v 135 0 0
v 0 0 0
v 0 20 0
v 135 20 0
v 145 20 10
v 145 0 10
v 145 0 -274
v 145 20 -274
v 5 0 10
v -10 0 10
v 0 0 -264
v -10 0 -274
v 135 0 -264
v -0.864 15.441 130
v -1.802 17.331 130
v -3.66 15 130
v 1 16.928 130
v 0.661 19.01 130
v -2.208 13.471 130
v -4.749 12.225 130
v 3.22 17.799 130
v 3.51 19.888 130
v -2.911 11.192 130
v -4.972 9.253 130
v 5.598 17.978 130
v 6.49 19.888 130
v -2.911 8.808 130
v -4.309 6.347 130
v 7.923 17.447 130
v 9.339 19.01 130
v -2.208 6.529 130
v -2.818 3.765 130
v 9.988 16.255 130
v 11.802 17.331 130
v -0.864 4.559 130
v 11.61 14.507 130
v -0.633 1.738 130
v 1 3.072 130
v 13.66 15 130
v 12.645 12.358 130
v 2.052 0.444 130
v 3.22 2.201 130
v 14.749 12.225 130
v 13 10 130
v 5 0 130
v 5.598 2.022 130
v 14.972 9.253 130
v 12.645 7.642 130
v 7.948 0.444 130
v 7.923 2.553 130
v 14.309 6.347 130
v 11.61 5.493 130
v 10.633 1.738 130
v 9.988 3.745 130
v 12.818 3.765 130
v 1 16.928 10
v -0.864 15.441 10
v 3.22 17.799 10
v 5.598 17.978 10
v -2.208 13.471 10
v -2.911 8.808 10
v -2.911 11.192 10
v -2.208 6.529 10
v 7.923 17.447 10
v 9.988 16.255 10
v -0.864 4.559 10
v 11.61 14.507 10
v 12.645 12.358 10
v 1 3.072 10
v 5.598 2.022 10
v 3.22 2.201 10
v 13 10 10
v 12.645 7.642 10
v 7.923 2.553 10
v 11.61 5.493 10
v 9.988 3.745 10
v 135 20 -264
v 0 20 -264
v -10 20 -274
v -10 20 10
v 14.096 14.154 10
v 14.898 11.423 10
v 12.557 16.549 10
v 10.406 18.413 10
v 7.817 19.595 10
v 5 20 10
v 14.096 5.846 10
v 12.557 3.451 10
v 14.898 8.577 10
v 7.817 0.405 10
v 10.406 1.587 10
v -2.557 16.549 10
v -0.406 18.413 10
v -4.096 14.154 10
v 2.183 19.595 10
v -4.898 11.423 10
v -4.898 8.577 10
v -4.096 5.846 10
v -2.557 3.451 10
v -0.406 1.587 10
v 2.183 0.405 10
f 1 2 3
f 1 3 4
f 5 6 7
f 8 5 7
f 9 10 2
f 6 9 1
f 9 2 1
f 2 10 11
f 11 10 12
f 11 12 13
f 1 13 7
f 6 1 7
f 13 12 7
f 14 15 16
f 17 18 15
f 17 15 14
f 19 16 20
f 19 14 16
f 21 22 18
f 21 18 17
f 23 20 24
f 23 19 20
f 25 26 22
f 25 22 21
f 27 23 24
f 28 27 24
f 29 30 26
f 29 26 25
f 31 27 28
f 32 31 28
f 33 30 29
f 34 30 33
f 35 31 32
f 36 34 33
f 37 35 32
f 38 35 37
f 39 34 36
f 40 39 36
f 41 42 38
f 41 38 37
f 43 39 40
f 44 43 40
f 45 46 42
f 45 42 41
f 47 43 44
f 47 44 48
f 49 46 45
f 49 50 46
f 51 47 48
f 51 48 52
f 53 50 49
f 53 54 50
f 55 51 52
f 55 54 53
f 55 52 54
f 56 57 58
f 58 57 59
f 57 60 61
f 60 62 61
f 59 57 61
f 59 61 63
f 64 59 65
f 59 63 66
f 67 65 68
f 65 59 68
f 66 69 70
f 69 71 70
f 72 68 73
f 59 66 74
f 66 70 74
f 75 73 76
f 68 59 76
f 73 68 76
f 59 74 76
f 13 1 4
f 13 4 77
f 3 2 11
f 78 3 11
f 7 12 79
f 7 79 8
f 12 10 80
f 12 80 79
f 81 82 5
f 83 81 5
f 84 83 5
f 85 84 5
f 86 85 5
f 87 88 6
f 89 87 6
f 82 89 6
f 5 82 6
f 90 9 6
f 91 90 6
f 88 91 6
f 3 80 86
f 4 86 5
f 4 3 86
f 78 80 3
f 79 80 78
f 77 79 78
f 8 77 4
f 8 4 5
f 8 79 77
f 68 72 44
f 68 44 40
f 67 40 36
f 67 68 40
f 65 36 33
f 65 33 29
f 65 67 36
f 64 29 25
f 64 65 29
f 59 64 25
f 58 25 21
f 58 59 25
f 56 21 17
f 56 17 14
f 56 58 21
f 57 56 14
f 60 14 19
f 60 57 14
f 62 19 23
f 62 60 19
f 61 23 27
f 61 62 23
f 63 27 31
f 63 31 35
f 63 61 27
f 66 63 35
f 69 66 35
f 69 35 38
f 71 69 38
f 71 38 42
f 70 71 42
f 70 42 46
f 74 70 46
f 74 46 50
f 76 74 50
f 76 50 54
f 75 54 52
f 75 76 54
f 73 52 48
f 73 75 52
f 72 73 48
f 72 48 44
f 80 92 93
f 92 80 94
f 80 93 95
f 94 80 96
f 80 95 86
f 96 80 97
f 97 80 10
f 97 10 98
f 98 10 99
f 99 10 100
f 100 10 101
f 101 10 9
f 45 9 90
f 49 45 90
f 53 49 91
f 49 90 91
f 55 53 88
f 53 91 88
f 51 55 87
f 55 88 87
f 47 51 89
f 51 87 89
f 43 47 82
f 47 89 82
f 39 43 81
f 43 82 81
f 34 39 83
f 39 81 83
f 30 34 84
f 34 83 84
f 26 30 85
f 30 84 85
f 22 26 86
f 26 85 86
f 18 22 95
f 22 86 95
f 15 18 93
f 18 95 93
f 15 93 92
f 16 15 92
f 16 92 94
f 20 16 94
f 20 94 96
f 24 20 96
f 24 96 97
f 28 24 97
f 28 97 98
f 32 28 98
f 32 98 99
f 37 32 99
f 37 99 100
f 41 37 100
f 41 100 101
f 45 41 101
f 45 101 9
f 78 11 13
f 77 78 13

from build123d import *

# Parameters (mm, degrees)
SCHIZZO1_W                   = 155
SCHIZZO1_H                   = 284
SCHIZZO1_W_2                 = 135
SCHIZZO1_H_2                 = 264
ESTRUSIONE_SOTTILE1_DEPTH    = 20
SCHIZZO2_R                   = 10
SCHIZZO2_R_2                 = 8
ESTRUSIONE_ESTRUSIONE1_DEPTH = 120


with BuildPart() as part:
    # Schizzo1 → Estrusione-Sottile1 (new body)
    with BuildSketch(Plane(origin=(0, 0, 0), x_dir=(1, 0, 0), z_dir=(0, 1, 0))):
        with Locations((67.5, 132)):
            Rectangle(SCHIZZO1_W, SCHIZZO1_H)
        with Locations((67.5, 132)):
            Rectangle(SCHIZZO1_W_2, SCHIZZO1_H_2, mode=Mode.SUBTRACT)
    extrude(amount=ESTRUSIONE_SOTTILE1_DEPTH)

    # Schizzo2 → Estrusione-Estrusione1 (add)
    with BuildSketch(Plane.XY.offset(10)):
        with Locations(Location((5, 10, 0), (0, 0, 270))):
            Circle(SCHIZZO2_R)
        with Locations((5, 10)):
            Circle(SCHIZZO2_R_2, mode=Mode.SUBTRACT)
    extrude(amount=ESTRUSIONE_ESTRUSIONE1_DEPTH)


solid = part.part
